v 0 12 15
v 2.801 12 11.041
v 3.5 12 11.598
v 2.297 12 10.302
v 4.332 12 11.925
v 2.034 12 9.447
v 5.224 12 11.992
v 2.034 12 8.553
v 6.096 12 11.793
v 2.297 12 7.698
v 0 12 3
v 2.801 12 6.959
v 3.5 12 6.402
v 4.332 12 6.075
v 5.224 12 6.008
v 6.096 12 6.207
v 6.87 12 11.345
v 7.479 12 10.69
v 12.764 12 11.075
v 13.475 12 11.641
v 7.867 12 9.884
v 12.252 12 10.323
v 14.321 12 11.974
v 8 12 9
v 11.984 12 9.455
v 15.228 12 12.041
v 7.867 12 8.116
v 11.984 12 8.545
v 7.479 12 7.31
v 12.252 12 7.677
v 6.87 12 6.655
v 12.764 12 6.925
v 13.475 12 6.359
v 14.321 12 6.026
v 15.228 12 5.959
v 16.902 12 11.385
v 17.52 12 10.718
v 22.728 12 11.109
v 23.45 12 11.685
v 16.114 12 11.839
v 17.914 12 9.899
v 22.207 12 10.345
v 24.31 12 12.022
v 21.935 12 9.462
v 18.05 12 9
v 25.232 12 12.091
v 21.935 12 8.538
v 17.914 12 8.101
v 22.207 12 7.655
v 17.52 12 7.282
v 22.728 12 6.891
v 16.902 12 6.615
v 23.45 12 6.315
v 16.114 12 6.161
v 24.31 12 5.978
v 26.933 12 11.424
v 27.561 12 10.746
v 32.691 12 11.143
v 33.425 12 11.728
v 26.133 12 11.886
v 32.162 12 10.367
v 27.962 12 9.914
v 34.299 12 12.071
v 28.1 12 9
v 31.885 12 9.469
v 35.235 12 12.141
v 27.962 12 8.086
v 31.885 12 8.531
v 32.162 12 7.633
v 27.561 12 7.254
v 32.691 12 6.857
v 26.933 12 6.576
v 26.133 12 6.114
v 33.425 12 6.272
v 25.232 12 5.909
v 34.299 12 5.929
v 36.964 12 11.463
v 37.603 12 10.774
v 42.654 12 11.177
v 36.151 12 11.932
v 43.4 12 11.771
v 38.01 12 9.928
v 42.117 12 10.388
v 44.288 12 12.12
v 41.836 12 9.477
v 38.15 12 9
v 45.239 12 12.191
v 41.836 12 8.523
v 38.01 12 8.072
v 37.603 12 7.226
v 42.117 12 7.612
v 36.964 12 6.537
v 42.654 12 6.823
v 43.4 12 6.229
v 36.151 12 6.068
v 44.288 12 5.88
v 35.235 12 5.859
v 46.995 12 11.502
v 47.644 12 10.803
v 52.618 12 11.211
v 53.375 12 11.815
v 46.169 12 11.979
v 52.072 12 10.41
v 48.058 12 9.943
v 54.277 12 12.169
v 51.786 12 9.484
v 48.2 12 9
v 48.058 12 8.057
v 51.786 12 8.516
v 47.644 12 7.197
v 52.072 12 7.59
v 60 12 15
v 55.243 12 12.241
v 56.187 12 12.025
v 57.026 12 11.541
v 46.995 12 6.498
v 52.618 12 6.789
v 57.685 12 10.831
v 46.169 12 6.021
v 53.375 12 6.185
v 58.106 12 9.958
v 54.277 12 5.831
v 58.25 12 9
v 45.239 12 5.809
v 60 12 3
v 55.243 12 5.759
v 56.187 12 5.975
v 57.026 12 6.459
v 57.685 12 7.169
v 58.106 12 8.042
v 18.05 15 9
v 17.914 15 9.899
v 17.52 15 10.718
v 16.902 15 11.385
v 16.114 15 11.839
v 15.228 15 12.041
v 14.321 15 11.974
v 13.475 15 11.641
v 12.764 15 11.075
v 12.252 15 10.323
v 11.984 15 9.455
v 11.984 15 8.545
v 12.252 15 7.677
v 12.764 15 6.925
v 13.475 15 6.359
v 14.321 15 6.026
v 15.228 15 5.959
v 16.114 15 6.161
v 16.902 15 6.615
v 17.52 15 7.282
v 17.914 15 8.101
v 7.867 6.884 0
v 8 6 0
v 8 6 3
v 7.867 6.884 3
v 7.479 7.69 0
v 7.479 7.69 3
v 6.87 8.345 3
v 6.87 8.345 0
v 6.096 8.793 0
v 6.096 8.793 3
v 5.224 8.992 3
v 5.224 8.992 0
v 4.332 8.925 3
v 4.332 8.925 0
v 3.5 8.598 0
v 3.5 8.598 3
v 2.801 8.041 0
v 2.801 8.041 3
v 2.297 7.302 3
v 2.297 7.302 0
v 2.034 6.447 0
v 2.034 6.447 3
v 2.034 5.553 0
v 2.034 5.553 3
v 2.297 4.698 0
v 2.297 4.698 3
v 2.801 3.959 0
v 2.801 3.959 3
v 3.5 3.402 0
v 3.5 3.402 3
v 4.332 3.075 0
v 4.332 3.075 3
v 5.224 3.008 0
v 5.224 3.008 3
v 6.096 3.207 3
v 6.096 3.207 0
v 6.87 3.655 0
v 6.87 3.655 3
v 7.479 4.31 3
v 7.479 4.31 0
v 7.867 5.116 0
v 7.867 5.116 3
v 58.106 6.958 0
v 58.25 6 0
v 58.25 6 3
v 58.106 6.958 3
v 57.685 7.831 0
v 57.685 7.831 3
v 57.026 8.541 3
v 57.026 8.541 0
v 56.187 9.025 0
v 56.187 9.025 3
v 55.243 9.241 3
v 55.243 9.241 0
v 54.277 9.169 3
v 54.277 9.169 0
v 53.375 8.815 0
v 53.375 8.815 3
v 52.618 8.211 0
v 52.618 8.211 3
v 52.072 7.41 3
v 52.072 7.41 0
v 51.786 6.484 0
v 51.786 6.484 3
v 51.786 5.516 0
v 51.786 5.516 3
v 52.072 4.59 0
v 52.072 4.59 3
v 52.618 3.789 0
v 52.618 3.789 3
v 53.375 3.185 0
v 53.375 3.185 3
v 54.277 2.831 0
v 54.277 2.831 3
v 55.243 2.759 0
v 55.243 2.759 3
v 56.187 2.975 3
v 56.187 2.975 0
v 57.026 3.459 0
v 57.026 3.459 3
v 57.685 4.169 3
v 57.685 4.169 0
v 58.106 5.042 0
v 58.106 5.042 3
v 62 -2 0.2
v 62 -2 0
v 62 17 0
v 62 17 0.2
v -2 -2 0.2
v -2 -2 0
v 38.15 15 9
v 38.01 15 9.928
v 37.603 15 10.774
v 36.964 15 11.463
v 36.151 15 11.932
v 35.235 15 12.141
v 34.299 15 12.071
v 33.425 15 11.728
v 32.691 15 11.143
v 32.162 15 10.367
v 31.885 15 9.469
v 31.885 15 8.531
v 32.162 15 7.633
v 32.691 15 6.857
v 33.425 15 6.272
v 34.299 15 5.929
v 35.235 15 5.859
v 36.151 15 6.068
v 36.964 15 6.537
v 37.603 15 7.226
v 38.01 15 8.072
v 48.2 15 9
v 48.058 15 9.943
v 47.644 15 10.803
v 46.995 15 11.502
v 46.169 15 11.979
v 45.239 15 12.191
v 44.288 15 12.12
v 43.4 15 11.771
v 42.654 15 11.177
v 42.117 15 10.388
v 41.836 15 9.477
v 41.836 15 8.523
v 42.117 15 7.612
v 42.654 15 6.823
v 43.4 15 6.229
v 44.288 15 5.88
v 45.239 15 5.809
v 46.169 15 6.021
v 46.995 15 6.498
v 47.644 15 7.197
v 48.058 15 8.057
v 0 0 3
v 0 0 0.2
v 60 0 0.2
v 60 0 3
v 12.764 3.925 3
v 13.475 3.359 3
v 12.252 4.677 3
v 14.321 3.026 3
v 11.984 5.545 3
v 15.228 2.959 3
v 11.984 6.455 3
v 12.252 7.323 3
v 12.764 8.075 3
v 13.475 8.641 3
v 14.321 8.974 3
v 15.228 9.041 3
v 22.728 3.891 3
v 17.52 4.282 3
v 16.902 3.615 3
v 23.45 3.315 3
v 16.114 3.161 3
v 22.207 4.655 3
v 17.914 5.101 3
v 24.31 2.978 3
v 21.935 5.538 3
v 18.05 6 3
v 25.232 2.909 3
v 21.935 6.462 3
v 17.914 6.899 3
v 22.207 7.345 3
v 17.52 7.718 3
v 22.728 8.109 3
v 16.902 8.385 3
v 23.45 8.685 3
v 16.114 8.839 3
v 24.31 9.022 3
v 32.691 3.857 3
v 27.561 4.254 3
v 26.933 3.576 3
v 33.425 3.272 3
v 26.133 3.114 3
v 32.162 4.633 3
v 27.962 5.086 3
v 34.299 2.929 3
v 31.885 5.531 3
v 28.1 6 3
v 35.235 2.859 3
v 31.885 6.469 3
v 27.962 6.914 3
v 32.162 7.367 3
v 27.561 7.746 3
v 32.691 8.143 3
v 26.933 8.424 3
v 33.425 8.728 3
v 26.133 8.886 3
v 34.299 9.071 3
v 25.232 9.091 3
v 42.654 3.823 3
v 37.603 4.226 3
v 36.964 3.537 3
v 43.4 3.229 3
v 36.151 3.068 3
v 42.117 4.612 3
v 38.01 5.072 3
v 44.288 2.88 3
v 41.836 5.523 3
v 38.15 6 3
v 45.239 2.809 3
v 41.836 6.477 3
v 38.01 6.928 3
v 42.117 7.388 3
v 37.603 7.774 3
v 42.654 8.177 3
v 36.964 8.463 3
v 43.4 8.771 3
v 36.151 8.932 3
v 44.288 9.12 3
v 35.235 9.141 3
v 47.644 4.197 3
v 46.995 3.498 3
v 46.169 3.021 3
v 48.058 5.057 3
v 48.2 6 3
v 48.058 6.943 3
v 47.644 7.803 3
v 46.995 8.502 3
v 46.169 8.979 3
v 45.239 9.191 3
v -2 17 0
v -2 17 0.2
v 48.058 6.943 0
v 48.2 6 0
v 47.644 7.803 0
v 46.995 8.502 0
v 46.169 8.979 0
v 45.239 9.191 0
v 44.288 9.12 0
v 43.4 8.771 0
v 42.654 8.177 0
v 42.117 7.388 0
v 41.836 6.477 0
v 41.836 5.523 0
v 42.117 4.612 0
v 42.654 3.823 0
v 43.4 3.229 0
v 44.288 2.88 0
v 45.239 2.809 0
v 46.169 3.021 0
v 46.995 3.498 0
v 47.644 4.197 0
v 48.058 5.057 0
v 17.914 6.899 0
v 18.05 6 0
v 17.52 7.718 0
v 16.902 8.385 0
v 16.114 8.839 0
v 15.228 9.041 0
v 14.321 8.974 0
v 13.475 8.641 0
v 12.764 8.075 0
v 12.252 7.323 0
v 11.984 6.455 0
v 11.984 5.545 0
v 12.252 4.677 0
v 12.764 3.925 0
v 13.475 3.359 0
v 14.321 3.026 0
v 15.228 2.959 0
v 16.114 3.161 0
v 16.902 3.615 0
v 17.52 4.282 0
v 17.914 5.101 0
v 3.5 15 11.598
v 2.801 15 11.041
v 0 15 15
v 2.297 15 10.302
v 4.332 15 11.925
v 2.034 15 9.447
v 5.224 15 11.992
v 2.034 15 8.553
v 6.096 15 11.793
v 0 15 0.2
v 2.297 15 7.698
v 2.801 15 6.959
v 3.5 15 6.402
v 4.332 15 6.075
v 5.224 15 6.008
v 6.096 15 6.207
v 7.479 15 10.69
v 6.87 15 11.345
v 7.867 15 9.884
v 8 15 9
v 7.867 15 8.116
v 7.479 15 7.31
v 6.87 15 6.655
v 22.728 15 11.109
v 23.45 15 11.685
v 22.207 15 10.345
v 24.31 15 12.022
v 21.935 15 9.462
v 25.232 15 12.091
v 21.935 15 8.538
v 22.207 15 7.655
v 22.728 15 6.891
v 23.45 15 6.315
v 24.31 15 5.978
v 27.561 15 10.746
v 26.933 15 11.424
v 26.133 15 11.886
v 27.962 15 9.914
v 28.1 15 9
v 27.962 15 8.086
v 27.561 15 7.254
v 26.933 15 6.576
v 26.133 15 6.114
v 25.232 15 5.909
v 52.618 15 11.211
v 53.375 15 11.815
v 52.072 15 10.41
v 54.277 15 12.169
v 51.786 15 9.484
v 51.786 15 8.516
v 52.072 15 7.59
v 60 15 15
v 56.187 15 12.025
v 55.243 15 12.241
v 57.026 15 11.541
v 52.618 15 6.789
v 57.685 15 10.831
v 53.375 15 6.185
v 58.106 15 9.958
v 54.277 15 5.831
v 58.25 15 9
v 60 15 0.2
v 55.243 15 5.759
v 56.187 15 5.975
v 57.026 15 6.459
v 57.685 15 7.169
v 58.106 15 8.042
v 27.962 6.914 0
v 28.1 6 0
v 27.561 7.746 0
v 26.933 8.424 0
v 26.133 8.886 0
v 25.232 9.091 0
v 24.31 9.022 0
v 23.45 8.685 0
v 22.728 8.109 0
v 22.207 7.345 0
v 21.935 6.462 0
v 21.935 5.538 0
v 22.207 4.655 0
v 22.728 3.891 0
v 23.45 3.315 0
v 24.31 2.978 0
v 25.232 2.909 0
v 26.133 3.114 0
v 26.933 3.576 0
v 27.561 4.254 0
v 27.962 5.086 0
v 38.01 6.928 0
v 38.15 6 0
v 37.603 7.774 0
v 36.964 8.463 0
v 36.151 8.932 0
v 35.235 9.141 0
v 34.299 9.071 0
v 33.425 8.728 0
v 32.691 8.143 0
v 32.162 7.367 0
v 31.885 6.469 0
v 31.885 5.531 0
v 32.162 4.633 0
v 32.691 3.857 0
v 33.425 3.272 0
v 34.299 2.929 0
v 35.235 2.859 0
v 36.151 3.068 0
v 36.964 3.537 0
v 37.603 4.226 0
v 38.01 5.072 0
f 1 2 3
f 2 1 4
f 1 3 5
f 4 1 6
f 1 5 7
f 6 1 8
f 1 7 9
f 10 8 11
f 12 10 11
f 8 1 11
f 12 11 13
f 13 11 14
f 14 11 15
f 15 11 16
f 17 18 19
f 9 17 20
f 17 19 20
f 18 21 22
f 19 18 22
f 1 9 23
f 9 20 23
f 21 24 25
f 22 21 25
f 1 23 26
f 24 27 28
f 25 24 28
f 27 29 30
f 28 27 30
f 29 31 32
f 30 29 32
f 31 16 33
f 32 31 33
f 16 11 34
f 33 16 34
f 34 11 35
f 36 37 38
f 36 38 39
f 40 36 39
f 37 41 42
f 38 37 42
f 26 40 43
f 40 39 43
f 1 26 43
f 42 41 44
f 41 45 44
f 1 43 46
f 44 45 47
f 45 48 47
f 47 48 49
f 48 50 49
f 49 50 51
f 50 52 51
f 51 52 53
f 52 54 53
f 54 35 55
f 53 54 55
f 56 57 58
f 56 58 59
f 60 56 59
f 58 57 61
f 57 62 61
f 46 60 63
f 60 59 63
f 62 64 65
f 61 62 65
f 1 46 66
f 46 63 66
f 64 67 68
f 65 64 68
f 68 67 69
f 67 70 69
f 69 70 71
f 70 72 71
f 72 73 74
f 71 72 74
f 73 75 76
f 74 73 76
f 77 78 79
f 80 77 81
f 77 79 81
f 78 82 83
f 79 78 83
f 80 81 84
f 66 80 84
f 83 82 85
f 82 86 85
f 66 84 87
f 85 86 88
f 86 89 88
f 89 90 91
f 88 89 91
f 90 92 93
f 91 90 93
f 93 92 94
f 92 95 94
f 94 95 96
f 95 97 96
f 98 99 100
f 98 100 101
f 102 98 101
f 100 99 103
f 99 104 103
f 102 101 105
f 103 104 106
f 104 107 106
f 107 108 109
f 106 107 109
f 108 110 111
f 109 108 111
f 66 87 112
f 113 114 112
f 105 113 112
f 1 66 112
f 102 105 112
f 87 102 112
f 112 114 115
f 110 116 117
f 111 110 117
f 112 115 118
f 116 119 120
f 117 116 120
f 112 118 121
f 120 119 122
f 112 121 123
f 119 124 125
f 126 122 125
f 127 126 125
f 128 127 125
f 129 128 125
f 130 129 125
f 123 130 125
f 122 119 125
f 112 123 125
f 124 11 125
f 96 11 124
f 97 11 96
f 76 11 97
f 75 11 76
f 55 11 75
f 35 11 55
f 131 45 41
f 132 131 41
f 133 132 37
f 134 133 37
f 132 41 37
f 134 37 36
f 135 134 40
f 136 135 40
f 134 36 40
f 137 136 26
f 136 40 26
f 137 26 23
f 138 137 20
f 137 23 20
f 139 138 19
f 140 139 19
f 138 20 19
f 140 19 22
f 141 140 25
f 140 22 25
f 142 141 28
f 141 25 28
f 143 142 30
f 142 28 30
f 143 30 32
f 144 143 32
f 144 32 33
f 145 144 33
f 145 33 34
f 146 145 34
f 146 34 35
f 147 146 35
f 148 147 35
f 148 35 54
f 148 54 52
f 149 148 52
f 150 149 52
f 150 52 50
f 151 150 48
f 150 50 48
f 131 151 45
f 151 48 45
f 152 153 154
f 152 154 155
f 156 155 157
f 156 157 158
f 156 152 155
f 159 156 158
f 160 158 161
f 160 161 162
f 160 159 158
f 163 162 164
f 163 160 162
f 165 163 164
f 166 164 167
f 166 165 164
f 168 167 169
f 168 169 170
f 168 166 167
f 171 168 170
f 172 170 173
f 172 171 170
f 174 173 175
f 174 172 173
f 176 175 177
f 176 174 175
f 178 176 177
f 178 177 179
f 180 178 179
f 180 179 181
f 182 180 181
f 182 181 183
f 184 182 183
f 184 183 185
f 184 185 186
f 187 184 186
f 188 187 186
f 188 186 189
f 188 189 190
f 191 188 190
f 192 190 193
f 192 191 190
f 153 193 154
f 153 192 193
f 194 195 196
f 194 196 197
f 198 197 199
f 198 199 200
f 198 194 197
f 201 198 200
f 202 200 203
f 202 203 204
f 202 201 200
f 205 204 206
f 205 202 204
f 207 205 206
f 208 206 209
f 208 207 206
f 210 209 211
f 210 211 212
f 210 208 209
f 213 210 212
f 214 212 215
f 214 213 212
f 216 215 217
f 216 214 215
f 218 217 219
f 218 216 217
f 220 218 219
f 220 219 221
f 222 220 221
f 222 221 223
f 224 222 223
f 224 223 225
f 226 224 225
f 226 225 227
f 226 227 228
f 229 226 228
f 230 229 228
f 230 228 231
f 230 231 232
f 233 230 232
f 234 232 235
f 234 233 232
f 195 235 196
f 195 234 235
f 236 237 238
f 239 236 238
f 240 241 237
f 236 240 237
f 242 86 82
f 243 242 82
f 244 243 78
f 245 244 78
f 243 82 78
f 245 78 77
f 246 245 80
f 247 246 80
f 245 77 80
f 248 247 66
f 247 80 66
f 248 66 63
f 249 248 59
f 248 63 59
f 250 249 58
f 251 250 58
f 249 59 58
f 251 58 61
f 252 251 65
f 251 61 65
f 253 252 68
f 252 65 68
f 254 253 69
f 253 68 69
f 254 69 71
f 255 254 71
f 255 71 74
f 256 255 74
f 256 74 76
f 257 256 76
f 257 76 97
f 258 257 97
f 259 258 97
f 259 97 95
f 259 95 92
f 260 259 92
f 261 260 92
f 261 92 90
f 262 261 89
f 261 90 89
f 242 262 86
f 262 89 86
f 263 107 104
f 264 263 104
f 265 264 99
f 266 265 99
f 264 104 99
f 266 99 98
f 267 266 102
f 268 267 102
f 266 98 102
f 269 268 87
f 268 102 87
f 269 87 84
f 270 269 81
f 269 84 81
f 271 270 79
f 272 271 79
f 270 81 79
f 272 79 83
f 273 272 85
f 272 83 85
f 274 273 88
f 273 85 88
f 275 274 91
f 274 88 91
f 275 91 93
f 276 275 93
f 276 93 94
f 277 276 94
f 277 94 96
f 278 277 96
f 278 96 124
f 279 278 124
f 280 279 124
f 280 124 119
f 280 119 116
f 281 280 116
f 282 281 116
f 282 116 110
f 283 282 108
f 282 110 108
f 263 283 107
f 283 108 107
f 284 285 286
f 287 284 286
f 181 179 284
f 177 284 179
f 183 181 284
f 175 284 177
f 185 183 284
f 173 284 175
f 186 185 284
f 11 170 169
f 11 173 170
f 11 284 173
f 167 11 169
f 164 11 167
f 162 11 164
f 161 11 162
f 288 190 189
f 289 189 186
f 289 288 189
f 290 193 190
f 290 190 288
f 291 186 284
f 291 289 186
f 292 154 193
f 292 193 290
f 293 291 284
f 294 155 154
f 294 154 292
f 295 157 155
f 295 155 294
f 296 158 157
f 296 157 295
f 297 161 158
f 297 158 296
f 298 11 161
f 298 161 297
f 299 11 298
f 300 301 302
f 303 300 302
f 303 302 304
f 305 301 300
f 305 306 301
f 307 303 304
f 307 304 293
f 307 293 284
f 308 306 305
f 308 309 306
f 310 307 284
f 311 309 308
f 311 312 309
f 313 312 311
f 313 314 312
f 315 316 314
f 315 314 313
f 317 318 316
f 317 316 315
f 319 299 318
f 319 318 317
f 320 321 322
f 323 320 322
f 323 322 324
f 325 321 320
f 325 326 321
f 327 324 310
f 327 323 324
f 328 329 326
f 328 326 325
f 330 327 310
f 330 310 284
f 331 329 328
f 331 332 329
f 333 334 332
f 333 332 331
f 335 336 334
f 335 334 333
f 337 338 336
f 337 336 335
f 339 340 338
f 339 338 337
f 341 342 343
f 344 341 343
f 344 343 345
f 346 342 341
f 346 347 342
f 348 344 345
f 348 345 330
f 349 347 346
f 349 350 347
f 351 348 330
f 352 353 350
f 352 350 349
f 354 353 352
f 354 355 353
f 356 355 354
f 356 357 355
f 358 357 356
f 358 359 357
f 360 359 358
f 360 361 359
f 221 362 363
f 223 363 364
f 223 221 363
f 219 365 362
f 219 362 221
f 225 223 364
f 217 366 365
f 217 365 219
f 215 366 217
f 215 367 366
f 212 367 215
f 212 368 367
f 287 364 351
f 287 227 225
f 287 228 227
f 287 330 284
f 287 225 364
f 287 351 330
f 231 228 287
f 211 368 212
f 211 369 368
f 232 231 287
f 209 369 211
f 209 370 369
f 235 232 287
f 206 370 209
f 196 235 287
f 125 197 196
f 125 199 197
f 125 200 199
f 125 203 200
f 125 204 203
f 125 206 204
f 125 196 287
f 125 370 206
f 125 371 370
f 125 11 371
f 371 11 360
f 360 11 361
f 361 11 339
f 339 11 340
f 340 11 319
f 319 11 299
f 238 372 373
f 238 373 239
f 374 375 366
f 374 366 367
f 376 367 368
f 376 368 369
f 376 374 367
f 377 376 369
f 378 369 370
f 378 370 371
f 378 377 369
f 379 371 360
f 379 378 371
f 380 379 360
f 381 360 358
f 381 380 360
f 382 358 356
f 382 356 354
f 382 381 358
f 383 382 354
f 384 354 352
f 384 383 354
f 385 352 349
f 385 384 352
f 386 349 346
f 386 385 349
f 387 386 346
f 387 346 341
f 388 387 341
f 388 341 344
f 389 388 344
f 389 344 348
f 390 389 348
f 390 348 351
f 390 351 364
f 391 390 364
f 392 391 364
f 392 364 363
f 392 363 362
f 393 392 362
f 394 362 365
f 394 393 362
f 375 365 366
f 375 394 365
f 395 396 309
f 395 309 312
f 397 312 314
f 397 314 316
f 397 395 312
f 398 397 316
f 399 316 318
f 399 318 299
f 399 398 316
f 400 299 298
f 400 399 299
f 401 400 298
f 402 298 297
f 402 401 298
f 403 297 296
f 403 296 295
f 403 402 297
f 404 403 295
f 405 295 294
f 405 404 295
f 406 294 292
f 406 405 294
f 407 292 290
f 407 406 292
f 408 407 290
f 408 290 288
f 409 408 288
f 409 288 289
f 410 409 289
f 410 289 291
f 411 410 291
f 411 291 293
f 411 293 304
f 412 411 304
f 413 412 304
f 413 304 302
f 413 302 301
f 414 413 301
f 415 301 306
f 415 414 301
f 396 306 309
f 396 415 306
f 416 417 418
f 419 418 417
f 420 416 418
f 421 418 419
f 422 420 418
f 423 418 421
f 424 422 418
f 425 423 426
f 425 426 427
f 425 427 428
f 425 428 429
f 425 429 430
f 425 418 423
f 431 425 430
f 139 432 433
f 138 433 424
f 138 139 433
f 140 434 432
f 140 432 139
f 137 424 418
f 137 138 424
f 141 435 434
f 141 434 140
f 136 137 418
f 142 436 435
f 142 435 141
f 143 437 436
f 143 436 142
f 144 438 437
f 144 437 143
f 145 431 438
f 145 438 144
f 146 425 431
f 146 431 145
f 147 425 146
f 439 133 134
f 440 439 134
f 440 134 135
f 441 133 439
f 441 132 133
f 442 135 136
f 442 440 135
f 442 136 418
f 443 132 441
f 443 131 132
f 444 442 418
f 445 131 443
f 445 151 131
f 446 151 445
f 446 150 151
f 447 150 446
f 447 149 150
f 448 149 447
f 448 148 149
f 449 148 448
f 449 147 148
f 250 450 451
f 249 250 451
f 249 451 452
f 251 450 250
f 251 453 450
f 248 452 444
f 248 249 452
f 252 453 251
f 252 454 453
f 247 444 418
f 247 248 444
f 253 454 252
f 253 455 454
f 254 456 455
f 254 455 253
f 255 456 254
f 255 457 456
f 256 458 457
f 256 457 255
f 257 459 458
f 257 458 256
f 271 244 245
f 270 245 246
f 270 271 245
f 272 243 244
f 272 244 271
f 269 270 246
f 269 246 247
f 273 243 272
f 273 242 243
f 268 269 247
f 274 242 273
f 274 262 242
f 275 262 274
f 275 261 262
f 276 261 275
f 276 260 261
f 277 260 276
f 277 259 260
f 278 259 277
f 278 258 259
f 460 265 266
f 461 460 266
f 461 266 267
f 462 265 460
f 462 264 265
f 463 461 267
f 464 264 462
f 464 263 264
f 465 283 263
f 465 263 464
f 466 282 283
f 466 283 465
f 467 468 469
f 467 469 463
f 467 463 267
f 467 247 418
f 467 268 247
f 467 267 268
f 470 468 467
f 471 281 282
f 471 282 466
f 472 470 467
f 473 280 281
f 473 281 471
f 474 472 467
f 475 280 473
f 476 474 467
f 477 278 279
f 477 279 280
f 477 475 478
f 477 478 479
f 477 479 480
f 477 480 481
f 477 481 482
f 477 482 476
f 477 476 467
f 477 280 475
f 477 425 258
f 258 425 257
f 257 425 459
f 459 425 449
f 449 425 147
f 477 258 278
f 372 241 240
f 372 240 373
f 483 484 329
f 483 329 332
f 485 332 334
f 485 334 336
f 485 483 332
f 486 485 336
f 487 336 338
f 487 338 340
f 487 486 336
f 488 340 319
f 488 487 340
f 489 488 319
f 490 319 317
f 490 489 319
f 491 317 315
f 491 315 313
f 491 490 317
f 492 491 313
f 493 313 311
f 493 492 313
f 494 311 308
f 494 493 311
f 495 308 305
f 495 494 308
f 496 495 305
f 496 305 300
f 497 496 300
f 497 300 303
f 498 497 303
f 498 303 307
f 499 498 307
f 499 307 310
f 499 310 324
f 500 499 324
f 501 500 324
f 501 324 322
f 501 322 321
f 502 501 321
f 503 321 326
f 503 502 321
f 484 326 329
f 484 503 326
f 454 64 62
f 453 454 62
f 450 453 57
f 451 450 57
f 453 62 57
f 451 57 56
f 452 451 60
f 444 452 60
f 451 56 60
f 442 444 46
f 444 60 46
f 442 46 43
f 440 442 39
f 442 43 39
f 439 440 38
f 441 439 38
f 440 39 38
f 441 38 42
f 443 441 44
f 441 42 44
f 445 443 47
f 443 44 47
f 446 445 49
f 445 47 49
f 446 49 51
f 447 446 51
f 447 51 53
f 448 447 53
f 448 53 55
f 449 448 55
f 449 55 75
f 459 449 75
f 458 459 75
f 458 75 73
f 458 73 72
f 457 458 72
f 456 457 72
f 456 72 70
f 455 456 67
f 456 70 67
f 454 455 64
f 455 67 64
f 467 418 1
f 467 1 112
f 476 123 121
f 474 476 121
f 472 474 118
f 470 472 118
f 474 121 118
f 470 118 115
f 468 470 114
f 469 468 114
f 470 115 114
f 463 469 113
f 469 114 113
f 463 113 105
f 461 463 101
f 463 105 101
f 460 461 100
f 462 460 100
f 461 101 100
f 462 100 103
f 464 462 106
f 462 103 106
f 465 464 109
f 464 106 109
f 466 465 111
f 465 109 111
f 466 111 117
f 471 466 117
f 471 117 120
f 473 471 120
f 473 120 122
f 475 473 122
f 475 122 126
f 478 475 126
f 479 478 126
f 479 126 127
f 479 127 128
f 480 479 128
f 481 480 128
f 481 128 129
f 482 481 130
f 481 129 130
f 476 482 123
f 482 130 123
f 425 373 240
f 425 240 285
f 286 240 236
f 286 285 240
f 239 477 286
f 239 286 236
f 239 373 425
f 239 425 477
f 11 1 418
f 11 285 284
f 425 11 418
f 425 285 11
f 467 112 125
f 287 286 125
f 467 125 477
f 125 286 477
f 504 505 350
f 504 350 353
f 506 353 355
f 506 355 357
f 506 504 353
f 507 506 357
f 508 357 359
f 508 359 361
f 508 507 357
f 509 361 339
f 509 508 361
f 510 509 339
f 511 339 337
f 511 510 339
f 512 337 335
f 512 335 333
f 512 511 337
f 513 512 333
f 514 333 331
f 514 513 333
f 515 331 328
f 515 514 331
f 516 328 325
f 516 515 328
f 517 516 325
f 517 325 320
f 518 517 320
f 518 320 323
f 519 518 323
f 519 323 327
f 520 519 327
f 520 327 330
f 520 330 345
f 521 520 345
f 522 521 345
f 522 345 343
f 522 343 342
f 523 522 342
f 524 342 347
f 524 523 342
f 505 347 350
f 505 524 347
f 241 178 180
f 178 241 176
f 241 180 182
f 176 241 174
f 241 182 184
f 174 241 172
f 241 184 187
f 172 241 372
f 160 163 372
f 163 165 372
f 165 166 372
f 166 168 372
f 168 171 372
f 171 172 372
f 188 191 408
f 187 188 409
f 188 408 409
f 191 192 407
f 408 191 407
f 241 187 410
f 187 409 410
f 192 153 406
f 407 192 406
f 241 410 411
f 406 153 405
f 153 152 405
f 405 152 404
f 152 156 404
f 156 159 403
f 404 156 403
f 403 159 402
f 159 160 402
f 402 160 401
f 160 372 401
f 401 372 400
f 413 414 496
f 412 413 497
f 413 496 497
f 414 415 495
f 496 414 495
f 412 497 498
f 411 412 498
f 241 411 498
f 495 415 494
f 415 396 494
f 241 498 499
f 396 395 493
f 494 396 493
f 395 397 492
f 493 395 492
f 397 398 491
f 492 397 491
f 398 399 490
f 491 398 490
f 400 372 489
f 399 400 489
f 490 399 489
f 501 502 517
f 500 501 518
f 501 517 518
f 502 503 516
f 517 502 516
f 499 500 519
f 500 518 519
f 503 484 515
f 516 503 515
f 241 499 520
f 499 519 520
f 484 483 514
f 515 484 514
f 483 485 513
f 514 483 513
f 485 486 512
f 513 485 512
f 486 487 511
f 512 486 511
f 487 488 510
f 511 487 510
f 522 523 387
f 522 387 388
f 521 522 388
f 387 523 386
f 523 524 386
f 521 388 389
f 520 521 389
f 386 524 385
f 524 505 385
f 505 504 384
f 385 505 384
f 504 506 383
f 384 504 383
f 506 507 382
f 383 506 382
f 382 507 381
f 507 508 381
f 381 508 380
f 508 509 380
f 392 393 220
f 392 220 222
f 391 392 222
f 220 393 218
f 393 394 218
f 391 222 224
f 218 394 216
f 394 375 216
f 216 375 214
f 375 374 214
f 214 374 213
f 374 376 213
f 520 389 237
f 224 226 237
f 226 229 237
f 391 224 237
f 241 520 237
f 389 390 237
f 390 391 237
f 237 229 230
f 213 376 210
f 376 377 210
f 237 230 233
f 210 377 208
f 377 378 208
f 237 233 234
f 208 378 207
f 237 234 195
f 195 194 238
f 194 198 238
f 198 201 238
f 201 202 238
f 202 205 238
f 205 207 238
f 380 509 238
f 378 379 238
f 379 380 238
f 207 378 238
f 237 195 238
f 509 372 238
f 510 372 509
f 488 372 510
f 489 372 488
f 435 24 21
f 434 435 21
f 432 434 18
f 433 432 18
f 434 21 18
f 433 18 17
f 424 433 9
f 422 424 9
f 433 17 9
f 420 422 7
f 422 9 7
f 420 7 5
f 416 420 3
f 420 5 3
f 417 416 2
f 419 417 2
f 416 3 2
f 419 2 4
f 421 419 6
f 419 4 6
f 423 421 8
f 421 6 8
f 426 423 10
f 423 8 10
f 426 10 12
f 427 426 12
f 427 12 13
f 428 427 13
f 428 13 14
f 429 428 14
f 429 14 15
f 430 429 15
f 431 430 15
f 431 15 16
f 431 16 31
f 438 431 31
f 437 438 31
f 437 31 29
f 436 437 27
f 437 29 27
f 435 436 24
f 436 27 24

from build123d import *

# Parameters (mm, degrees)
F0_W     = 60
F0_H     = 15
F0_R     = 3
F0_R_2   = 3.05
F0_R_3   = 3.1
F0_R_4   = 3.15
F0_R_5   = 3.2
F0_R_6   = 3.25
F1_DEPTH = 3
F2_W     = 64
F2_H     = 19
F2_W_2   = 60
F2_H_2   = 15
F3_DEPTH = 0.2
F4_W     = 60
F4_H     = 3
F5_DEPTH = 12
F6_R     = 3
F6_R_2   = 3.05
F6_R_3   = 3.1
F6_R_4   = 3.15
F6_R_5   = 3.2
F6_R_6   = 3.25
F7_DEPTH = 3


with BuildPart() as f1:
    # F0 (on Top) → F1 (new body)
    with BuildSketch(Plane.XY):
        with Locations((30, 7.5)):
            Rectangle(F0_W, F0_H)
        with Locations((5, 6)):
            Circle(F0_R, mode=Mode.SUBTRACT)
        with Locations((15, 6)):
            Circle(F0_R_2, mode=Mode.SUBTRACT)
        with Locations((25, 6)):
            Circle(F0_R_3, mode=Mode.SUBTRACT)
        with Locations((35, 6)):
            Circle(F0_R_4, mode=Mode.SUBTRACT)
        with Locations((45, 6)):
            Circle(F0_R_5, mode=Mode.SUBTRACT)
        with Locations((55, 6)):
            Circle(F0_R_6, mode=Mode.SUBTRACT)
    extrude(amount=F1_DEPTH)

    # F2 (on Top) → F3 (join)
    with BuildSketch(Plane.XY):
        with Locations((30, 7.5)):
            Rectangle(F2_W, F2_H)
        with Locations((30, 7.5)):
            Rectangle(F2_W_2, F2_H_2, mode=Mode.SUBTRACT)
    extrude(amount=F3_DEPTH)

    # F4 (on face) → F5 (join)
    with BuildSketch(Plane.XY.offset(3)):
        with Locations((30, 13.5)):
            Rectangle(F4_W, F4_H)
    extrude(amount=F5_DEPTH)

    # F6 (on face) → F7 (cut, through all)
    with BuildSketch(Plane.XZ.offset(-12)):
        with Locations((5, 9)):
            Circle(F6_R)
        with Locations((15, 9)):
            Circle(F6_R_2)
        with Locations((25, 9)):
            Circle(F6_R_3)
        with Locations((35, 9)):
            Circle(F6_R_4)
        with Locations((45, 9)):
            Circle(F6_R_5)
        with Locations((55, 9)):
            Circle(F6_R_6)
    extrude(amount=-F7_DEPTH, mode=Mode.SUBTRACT)


solid = f1.part
